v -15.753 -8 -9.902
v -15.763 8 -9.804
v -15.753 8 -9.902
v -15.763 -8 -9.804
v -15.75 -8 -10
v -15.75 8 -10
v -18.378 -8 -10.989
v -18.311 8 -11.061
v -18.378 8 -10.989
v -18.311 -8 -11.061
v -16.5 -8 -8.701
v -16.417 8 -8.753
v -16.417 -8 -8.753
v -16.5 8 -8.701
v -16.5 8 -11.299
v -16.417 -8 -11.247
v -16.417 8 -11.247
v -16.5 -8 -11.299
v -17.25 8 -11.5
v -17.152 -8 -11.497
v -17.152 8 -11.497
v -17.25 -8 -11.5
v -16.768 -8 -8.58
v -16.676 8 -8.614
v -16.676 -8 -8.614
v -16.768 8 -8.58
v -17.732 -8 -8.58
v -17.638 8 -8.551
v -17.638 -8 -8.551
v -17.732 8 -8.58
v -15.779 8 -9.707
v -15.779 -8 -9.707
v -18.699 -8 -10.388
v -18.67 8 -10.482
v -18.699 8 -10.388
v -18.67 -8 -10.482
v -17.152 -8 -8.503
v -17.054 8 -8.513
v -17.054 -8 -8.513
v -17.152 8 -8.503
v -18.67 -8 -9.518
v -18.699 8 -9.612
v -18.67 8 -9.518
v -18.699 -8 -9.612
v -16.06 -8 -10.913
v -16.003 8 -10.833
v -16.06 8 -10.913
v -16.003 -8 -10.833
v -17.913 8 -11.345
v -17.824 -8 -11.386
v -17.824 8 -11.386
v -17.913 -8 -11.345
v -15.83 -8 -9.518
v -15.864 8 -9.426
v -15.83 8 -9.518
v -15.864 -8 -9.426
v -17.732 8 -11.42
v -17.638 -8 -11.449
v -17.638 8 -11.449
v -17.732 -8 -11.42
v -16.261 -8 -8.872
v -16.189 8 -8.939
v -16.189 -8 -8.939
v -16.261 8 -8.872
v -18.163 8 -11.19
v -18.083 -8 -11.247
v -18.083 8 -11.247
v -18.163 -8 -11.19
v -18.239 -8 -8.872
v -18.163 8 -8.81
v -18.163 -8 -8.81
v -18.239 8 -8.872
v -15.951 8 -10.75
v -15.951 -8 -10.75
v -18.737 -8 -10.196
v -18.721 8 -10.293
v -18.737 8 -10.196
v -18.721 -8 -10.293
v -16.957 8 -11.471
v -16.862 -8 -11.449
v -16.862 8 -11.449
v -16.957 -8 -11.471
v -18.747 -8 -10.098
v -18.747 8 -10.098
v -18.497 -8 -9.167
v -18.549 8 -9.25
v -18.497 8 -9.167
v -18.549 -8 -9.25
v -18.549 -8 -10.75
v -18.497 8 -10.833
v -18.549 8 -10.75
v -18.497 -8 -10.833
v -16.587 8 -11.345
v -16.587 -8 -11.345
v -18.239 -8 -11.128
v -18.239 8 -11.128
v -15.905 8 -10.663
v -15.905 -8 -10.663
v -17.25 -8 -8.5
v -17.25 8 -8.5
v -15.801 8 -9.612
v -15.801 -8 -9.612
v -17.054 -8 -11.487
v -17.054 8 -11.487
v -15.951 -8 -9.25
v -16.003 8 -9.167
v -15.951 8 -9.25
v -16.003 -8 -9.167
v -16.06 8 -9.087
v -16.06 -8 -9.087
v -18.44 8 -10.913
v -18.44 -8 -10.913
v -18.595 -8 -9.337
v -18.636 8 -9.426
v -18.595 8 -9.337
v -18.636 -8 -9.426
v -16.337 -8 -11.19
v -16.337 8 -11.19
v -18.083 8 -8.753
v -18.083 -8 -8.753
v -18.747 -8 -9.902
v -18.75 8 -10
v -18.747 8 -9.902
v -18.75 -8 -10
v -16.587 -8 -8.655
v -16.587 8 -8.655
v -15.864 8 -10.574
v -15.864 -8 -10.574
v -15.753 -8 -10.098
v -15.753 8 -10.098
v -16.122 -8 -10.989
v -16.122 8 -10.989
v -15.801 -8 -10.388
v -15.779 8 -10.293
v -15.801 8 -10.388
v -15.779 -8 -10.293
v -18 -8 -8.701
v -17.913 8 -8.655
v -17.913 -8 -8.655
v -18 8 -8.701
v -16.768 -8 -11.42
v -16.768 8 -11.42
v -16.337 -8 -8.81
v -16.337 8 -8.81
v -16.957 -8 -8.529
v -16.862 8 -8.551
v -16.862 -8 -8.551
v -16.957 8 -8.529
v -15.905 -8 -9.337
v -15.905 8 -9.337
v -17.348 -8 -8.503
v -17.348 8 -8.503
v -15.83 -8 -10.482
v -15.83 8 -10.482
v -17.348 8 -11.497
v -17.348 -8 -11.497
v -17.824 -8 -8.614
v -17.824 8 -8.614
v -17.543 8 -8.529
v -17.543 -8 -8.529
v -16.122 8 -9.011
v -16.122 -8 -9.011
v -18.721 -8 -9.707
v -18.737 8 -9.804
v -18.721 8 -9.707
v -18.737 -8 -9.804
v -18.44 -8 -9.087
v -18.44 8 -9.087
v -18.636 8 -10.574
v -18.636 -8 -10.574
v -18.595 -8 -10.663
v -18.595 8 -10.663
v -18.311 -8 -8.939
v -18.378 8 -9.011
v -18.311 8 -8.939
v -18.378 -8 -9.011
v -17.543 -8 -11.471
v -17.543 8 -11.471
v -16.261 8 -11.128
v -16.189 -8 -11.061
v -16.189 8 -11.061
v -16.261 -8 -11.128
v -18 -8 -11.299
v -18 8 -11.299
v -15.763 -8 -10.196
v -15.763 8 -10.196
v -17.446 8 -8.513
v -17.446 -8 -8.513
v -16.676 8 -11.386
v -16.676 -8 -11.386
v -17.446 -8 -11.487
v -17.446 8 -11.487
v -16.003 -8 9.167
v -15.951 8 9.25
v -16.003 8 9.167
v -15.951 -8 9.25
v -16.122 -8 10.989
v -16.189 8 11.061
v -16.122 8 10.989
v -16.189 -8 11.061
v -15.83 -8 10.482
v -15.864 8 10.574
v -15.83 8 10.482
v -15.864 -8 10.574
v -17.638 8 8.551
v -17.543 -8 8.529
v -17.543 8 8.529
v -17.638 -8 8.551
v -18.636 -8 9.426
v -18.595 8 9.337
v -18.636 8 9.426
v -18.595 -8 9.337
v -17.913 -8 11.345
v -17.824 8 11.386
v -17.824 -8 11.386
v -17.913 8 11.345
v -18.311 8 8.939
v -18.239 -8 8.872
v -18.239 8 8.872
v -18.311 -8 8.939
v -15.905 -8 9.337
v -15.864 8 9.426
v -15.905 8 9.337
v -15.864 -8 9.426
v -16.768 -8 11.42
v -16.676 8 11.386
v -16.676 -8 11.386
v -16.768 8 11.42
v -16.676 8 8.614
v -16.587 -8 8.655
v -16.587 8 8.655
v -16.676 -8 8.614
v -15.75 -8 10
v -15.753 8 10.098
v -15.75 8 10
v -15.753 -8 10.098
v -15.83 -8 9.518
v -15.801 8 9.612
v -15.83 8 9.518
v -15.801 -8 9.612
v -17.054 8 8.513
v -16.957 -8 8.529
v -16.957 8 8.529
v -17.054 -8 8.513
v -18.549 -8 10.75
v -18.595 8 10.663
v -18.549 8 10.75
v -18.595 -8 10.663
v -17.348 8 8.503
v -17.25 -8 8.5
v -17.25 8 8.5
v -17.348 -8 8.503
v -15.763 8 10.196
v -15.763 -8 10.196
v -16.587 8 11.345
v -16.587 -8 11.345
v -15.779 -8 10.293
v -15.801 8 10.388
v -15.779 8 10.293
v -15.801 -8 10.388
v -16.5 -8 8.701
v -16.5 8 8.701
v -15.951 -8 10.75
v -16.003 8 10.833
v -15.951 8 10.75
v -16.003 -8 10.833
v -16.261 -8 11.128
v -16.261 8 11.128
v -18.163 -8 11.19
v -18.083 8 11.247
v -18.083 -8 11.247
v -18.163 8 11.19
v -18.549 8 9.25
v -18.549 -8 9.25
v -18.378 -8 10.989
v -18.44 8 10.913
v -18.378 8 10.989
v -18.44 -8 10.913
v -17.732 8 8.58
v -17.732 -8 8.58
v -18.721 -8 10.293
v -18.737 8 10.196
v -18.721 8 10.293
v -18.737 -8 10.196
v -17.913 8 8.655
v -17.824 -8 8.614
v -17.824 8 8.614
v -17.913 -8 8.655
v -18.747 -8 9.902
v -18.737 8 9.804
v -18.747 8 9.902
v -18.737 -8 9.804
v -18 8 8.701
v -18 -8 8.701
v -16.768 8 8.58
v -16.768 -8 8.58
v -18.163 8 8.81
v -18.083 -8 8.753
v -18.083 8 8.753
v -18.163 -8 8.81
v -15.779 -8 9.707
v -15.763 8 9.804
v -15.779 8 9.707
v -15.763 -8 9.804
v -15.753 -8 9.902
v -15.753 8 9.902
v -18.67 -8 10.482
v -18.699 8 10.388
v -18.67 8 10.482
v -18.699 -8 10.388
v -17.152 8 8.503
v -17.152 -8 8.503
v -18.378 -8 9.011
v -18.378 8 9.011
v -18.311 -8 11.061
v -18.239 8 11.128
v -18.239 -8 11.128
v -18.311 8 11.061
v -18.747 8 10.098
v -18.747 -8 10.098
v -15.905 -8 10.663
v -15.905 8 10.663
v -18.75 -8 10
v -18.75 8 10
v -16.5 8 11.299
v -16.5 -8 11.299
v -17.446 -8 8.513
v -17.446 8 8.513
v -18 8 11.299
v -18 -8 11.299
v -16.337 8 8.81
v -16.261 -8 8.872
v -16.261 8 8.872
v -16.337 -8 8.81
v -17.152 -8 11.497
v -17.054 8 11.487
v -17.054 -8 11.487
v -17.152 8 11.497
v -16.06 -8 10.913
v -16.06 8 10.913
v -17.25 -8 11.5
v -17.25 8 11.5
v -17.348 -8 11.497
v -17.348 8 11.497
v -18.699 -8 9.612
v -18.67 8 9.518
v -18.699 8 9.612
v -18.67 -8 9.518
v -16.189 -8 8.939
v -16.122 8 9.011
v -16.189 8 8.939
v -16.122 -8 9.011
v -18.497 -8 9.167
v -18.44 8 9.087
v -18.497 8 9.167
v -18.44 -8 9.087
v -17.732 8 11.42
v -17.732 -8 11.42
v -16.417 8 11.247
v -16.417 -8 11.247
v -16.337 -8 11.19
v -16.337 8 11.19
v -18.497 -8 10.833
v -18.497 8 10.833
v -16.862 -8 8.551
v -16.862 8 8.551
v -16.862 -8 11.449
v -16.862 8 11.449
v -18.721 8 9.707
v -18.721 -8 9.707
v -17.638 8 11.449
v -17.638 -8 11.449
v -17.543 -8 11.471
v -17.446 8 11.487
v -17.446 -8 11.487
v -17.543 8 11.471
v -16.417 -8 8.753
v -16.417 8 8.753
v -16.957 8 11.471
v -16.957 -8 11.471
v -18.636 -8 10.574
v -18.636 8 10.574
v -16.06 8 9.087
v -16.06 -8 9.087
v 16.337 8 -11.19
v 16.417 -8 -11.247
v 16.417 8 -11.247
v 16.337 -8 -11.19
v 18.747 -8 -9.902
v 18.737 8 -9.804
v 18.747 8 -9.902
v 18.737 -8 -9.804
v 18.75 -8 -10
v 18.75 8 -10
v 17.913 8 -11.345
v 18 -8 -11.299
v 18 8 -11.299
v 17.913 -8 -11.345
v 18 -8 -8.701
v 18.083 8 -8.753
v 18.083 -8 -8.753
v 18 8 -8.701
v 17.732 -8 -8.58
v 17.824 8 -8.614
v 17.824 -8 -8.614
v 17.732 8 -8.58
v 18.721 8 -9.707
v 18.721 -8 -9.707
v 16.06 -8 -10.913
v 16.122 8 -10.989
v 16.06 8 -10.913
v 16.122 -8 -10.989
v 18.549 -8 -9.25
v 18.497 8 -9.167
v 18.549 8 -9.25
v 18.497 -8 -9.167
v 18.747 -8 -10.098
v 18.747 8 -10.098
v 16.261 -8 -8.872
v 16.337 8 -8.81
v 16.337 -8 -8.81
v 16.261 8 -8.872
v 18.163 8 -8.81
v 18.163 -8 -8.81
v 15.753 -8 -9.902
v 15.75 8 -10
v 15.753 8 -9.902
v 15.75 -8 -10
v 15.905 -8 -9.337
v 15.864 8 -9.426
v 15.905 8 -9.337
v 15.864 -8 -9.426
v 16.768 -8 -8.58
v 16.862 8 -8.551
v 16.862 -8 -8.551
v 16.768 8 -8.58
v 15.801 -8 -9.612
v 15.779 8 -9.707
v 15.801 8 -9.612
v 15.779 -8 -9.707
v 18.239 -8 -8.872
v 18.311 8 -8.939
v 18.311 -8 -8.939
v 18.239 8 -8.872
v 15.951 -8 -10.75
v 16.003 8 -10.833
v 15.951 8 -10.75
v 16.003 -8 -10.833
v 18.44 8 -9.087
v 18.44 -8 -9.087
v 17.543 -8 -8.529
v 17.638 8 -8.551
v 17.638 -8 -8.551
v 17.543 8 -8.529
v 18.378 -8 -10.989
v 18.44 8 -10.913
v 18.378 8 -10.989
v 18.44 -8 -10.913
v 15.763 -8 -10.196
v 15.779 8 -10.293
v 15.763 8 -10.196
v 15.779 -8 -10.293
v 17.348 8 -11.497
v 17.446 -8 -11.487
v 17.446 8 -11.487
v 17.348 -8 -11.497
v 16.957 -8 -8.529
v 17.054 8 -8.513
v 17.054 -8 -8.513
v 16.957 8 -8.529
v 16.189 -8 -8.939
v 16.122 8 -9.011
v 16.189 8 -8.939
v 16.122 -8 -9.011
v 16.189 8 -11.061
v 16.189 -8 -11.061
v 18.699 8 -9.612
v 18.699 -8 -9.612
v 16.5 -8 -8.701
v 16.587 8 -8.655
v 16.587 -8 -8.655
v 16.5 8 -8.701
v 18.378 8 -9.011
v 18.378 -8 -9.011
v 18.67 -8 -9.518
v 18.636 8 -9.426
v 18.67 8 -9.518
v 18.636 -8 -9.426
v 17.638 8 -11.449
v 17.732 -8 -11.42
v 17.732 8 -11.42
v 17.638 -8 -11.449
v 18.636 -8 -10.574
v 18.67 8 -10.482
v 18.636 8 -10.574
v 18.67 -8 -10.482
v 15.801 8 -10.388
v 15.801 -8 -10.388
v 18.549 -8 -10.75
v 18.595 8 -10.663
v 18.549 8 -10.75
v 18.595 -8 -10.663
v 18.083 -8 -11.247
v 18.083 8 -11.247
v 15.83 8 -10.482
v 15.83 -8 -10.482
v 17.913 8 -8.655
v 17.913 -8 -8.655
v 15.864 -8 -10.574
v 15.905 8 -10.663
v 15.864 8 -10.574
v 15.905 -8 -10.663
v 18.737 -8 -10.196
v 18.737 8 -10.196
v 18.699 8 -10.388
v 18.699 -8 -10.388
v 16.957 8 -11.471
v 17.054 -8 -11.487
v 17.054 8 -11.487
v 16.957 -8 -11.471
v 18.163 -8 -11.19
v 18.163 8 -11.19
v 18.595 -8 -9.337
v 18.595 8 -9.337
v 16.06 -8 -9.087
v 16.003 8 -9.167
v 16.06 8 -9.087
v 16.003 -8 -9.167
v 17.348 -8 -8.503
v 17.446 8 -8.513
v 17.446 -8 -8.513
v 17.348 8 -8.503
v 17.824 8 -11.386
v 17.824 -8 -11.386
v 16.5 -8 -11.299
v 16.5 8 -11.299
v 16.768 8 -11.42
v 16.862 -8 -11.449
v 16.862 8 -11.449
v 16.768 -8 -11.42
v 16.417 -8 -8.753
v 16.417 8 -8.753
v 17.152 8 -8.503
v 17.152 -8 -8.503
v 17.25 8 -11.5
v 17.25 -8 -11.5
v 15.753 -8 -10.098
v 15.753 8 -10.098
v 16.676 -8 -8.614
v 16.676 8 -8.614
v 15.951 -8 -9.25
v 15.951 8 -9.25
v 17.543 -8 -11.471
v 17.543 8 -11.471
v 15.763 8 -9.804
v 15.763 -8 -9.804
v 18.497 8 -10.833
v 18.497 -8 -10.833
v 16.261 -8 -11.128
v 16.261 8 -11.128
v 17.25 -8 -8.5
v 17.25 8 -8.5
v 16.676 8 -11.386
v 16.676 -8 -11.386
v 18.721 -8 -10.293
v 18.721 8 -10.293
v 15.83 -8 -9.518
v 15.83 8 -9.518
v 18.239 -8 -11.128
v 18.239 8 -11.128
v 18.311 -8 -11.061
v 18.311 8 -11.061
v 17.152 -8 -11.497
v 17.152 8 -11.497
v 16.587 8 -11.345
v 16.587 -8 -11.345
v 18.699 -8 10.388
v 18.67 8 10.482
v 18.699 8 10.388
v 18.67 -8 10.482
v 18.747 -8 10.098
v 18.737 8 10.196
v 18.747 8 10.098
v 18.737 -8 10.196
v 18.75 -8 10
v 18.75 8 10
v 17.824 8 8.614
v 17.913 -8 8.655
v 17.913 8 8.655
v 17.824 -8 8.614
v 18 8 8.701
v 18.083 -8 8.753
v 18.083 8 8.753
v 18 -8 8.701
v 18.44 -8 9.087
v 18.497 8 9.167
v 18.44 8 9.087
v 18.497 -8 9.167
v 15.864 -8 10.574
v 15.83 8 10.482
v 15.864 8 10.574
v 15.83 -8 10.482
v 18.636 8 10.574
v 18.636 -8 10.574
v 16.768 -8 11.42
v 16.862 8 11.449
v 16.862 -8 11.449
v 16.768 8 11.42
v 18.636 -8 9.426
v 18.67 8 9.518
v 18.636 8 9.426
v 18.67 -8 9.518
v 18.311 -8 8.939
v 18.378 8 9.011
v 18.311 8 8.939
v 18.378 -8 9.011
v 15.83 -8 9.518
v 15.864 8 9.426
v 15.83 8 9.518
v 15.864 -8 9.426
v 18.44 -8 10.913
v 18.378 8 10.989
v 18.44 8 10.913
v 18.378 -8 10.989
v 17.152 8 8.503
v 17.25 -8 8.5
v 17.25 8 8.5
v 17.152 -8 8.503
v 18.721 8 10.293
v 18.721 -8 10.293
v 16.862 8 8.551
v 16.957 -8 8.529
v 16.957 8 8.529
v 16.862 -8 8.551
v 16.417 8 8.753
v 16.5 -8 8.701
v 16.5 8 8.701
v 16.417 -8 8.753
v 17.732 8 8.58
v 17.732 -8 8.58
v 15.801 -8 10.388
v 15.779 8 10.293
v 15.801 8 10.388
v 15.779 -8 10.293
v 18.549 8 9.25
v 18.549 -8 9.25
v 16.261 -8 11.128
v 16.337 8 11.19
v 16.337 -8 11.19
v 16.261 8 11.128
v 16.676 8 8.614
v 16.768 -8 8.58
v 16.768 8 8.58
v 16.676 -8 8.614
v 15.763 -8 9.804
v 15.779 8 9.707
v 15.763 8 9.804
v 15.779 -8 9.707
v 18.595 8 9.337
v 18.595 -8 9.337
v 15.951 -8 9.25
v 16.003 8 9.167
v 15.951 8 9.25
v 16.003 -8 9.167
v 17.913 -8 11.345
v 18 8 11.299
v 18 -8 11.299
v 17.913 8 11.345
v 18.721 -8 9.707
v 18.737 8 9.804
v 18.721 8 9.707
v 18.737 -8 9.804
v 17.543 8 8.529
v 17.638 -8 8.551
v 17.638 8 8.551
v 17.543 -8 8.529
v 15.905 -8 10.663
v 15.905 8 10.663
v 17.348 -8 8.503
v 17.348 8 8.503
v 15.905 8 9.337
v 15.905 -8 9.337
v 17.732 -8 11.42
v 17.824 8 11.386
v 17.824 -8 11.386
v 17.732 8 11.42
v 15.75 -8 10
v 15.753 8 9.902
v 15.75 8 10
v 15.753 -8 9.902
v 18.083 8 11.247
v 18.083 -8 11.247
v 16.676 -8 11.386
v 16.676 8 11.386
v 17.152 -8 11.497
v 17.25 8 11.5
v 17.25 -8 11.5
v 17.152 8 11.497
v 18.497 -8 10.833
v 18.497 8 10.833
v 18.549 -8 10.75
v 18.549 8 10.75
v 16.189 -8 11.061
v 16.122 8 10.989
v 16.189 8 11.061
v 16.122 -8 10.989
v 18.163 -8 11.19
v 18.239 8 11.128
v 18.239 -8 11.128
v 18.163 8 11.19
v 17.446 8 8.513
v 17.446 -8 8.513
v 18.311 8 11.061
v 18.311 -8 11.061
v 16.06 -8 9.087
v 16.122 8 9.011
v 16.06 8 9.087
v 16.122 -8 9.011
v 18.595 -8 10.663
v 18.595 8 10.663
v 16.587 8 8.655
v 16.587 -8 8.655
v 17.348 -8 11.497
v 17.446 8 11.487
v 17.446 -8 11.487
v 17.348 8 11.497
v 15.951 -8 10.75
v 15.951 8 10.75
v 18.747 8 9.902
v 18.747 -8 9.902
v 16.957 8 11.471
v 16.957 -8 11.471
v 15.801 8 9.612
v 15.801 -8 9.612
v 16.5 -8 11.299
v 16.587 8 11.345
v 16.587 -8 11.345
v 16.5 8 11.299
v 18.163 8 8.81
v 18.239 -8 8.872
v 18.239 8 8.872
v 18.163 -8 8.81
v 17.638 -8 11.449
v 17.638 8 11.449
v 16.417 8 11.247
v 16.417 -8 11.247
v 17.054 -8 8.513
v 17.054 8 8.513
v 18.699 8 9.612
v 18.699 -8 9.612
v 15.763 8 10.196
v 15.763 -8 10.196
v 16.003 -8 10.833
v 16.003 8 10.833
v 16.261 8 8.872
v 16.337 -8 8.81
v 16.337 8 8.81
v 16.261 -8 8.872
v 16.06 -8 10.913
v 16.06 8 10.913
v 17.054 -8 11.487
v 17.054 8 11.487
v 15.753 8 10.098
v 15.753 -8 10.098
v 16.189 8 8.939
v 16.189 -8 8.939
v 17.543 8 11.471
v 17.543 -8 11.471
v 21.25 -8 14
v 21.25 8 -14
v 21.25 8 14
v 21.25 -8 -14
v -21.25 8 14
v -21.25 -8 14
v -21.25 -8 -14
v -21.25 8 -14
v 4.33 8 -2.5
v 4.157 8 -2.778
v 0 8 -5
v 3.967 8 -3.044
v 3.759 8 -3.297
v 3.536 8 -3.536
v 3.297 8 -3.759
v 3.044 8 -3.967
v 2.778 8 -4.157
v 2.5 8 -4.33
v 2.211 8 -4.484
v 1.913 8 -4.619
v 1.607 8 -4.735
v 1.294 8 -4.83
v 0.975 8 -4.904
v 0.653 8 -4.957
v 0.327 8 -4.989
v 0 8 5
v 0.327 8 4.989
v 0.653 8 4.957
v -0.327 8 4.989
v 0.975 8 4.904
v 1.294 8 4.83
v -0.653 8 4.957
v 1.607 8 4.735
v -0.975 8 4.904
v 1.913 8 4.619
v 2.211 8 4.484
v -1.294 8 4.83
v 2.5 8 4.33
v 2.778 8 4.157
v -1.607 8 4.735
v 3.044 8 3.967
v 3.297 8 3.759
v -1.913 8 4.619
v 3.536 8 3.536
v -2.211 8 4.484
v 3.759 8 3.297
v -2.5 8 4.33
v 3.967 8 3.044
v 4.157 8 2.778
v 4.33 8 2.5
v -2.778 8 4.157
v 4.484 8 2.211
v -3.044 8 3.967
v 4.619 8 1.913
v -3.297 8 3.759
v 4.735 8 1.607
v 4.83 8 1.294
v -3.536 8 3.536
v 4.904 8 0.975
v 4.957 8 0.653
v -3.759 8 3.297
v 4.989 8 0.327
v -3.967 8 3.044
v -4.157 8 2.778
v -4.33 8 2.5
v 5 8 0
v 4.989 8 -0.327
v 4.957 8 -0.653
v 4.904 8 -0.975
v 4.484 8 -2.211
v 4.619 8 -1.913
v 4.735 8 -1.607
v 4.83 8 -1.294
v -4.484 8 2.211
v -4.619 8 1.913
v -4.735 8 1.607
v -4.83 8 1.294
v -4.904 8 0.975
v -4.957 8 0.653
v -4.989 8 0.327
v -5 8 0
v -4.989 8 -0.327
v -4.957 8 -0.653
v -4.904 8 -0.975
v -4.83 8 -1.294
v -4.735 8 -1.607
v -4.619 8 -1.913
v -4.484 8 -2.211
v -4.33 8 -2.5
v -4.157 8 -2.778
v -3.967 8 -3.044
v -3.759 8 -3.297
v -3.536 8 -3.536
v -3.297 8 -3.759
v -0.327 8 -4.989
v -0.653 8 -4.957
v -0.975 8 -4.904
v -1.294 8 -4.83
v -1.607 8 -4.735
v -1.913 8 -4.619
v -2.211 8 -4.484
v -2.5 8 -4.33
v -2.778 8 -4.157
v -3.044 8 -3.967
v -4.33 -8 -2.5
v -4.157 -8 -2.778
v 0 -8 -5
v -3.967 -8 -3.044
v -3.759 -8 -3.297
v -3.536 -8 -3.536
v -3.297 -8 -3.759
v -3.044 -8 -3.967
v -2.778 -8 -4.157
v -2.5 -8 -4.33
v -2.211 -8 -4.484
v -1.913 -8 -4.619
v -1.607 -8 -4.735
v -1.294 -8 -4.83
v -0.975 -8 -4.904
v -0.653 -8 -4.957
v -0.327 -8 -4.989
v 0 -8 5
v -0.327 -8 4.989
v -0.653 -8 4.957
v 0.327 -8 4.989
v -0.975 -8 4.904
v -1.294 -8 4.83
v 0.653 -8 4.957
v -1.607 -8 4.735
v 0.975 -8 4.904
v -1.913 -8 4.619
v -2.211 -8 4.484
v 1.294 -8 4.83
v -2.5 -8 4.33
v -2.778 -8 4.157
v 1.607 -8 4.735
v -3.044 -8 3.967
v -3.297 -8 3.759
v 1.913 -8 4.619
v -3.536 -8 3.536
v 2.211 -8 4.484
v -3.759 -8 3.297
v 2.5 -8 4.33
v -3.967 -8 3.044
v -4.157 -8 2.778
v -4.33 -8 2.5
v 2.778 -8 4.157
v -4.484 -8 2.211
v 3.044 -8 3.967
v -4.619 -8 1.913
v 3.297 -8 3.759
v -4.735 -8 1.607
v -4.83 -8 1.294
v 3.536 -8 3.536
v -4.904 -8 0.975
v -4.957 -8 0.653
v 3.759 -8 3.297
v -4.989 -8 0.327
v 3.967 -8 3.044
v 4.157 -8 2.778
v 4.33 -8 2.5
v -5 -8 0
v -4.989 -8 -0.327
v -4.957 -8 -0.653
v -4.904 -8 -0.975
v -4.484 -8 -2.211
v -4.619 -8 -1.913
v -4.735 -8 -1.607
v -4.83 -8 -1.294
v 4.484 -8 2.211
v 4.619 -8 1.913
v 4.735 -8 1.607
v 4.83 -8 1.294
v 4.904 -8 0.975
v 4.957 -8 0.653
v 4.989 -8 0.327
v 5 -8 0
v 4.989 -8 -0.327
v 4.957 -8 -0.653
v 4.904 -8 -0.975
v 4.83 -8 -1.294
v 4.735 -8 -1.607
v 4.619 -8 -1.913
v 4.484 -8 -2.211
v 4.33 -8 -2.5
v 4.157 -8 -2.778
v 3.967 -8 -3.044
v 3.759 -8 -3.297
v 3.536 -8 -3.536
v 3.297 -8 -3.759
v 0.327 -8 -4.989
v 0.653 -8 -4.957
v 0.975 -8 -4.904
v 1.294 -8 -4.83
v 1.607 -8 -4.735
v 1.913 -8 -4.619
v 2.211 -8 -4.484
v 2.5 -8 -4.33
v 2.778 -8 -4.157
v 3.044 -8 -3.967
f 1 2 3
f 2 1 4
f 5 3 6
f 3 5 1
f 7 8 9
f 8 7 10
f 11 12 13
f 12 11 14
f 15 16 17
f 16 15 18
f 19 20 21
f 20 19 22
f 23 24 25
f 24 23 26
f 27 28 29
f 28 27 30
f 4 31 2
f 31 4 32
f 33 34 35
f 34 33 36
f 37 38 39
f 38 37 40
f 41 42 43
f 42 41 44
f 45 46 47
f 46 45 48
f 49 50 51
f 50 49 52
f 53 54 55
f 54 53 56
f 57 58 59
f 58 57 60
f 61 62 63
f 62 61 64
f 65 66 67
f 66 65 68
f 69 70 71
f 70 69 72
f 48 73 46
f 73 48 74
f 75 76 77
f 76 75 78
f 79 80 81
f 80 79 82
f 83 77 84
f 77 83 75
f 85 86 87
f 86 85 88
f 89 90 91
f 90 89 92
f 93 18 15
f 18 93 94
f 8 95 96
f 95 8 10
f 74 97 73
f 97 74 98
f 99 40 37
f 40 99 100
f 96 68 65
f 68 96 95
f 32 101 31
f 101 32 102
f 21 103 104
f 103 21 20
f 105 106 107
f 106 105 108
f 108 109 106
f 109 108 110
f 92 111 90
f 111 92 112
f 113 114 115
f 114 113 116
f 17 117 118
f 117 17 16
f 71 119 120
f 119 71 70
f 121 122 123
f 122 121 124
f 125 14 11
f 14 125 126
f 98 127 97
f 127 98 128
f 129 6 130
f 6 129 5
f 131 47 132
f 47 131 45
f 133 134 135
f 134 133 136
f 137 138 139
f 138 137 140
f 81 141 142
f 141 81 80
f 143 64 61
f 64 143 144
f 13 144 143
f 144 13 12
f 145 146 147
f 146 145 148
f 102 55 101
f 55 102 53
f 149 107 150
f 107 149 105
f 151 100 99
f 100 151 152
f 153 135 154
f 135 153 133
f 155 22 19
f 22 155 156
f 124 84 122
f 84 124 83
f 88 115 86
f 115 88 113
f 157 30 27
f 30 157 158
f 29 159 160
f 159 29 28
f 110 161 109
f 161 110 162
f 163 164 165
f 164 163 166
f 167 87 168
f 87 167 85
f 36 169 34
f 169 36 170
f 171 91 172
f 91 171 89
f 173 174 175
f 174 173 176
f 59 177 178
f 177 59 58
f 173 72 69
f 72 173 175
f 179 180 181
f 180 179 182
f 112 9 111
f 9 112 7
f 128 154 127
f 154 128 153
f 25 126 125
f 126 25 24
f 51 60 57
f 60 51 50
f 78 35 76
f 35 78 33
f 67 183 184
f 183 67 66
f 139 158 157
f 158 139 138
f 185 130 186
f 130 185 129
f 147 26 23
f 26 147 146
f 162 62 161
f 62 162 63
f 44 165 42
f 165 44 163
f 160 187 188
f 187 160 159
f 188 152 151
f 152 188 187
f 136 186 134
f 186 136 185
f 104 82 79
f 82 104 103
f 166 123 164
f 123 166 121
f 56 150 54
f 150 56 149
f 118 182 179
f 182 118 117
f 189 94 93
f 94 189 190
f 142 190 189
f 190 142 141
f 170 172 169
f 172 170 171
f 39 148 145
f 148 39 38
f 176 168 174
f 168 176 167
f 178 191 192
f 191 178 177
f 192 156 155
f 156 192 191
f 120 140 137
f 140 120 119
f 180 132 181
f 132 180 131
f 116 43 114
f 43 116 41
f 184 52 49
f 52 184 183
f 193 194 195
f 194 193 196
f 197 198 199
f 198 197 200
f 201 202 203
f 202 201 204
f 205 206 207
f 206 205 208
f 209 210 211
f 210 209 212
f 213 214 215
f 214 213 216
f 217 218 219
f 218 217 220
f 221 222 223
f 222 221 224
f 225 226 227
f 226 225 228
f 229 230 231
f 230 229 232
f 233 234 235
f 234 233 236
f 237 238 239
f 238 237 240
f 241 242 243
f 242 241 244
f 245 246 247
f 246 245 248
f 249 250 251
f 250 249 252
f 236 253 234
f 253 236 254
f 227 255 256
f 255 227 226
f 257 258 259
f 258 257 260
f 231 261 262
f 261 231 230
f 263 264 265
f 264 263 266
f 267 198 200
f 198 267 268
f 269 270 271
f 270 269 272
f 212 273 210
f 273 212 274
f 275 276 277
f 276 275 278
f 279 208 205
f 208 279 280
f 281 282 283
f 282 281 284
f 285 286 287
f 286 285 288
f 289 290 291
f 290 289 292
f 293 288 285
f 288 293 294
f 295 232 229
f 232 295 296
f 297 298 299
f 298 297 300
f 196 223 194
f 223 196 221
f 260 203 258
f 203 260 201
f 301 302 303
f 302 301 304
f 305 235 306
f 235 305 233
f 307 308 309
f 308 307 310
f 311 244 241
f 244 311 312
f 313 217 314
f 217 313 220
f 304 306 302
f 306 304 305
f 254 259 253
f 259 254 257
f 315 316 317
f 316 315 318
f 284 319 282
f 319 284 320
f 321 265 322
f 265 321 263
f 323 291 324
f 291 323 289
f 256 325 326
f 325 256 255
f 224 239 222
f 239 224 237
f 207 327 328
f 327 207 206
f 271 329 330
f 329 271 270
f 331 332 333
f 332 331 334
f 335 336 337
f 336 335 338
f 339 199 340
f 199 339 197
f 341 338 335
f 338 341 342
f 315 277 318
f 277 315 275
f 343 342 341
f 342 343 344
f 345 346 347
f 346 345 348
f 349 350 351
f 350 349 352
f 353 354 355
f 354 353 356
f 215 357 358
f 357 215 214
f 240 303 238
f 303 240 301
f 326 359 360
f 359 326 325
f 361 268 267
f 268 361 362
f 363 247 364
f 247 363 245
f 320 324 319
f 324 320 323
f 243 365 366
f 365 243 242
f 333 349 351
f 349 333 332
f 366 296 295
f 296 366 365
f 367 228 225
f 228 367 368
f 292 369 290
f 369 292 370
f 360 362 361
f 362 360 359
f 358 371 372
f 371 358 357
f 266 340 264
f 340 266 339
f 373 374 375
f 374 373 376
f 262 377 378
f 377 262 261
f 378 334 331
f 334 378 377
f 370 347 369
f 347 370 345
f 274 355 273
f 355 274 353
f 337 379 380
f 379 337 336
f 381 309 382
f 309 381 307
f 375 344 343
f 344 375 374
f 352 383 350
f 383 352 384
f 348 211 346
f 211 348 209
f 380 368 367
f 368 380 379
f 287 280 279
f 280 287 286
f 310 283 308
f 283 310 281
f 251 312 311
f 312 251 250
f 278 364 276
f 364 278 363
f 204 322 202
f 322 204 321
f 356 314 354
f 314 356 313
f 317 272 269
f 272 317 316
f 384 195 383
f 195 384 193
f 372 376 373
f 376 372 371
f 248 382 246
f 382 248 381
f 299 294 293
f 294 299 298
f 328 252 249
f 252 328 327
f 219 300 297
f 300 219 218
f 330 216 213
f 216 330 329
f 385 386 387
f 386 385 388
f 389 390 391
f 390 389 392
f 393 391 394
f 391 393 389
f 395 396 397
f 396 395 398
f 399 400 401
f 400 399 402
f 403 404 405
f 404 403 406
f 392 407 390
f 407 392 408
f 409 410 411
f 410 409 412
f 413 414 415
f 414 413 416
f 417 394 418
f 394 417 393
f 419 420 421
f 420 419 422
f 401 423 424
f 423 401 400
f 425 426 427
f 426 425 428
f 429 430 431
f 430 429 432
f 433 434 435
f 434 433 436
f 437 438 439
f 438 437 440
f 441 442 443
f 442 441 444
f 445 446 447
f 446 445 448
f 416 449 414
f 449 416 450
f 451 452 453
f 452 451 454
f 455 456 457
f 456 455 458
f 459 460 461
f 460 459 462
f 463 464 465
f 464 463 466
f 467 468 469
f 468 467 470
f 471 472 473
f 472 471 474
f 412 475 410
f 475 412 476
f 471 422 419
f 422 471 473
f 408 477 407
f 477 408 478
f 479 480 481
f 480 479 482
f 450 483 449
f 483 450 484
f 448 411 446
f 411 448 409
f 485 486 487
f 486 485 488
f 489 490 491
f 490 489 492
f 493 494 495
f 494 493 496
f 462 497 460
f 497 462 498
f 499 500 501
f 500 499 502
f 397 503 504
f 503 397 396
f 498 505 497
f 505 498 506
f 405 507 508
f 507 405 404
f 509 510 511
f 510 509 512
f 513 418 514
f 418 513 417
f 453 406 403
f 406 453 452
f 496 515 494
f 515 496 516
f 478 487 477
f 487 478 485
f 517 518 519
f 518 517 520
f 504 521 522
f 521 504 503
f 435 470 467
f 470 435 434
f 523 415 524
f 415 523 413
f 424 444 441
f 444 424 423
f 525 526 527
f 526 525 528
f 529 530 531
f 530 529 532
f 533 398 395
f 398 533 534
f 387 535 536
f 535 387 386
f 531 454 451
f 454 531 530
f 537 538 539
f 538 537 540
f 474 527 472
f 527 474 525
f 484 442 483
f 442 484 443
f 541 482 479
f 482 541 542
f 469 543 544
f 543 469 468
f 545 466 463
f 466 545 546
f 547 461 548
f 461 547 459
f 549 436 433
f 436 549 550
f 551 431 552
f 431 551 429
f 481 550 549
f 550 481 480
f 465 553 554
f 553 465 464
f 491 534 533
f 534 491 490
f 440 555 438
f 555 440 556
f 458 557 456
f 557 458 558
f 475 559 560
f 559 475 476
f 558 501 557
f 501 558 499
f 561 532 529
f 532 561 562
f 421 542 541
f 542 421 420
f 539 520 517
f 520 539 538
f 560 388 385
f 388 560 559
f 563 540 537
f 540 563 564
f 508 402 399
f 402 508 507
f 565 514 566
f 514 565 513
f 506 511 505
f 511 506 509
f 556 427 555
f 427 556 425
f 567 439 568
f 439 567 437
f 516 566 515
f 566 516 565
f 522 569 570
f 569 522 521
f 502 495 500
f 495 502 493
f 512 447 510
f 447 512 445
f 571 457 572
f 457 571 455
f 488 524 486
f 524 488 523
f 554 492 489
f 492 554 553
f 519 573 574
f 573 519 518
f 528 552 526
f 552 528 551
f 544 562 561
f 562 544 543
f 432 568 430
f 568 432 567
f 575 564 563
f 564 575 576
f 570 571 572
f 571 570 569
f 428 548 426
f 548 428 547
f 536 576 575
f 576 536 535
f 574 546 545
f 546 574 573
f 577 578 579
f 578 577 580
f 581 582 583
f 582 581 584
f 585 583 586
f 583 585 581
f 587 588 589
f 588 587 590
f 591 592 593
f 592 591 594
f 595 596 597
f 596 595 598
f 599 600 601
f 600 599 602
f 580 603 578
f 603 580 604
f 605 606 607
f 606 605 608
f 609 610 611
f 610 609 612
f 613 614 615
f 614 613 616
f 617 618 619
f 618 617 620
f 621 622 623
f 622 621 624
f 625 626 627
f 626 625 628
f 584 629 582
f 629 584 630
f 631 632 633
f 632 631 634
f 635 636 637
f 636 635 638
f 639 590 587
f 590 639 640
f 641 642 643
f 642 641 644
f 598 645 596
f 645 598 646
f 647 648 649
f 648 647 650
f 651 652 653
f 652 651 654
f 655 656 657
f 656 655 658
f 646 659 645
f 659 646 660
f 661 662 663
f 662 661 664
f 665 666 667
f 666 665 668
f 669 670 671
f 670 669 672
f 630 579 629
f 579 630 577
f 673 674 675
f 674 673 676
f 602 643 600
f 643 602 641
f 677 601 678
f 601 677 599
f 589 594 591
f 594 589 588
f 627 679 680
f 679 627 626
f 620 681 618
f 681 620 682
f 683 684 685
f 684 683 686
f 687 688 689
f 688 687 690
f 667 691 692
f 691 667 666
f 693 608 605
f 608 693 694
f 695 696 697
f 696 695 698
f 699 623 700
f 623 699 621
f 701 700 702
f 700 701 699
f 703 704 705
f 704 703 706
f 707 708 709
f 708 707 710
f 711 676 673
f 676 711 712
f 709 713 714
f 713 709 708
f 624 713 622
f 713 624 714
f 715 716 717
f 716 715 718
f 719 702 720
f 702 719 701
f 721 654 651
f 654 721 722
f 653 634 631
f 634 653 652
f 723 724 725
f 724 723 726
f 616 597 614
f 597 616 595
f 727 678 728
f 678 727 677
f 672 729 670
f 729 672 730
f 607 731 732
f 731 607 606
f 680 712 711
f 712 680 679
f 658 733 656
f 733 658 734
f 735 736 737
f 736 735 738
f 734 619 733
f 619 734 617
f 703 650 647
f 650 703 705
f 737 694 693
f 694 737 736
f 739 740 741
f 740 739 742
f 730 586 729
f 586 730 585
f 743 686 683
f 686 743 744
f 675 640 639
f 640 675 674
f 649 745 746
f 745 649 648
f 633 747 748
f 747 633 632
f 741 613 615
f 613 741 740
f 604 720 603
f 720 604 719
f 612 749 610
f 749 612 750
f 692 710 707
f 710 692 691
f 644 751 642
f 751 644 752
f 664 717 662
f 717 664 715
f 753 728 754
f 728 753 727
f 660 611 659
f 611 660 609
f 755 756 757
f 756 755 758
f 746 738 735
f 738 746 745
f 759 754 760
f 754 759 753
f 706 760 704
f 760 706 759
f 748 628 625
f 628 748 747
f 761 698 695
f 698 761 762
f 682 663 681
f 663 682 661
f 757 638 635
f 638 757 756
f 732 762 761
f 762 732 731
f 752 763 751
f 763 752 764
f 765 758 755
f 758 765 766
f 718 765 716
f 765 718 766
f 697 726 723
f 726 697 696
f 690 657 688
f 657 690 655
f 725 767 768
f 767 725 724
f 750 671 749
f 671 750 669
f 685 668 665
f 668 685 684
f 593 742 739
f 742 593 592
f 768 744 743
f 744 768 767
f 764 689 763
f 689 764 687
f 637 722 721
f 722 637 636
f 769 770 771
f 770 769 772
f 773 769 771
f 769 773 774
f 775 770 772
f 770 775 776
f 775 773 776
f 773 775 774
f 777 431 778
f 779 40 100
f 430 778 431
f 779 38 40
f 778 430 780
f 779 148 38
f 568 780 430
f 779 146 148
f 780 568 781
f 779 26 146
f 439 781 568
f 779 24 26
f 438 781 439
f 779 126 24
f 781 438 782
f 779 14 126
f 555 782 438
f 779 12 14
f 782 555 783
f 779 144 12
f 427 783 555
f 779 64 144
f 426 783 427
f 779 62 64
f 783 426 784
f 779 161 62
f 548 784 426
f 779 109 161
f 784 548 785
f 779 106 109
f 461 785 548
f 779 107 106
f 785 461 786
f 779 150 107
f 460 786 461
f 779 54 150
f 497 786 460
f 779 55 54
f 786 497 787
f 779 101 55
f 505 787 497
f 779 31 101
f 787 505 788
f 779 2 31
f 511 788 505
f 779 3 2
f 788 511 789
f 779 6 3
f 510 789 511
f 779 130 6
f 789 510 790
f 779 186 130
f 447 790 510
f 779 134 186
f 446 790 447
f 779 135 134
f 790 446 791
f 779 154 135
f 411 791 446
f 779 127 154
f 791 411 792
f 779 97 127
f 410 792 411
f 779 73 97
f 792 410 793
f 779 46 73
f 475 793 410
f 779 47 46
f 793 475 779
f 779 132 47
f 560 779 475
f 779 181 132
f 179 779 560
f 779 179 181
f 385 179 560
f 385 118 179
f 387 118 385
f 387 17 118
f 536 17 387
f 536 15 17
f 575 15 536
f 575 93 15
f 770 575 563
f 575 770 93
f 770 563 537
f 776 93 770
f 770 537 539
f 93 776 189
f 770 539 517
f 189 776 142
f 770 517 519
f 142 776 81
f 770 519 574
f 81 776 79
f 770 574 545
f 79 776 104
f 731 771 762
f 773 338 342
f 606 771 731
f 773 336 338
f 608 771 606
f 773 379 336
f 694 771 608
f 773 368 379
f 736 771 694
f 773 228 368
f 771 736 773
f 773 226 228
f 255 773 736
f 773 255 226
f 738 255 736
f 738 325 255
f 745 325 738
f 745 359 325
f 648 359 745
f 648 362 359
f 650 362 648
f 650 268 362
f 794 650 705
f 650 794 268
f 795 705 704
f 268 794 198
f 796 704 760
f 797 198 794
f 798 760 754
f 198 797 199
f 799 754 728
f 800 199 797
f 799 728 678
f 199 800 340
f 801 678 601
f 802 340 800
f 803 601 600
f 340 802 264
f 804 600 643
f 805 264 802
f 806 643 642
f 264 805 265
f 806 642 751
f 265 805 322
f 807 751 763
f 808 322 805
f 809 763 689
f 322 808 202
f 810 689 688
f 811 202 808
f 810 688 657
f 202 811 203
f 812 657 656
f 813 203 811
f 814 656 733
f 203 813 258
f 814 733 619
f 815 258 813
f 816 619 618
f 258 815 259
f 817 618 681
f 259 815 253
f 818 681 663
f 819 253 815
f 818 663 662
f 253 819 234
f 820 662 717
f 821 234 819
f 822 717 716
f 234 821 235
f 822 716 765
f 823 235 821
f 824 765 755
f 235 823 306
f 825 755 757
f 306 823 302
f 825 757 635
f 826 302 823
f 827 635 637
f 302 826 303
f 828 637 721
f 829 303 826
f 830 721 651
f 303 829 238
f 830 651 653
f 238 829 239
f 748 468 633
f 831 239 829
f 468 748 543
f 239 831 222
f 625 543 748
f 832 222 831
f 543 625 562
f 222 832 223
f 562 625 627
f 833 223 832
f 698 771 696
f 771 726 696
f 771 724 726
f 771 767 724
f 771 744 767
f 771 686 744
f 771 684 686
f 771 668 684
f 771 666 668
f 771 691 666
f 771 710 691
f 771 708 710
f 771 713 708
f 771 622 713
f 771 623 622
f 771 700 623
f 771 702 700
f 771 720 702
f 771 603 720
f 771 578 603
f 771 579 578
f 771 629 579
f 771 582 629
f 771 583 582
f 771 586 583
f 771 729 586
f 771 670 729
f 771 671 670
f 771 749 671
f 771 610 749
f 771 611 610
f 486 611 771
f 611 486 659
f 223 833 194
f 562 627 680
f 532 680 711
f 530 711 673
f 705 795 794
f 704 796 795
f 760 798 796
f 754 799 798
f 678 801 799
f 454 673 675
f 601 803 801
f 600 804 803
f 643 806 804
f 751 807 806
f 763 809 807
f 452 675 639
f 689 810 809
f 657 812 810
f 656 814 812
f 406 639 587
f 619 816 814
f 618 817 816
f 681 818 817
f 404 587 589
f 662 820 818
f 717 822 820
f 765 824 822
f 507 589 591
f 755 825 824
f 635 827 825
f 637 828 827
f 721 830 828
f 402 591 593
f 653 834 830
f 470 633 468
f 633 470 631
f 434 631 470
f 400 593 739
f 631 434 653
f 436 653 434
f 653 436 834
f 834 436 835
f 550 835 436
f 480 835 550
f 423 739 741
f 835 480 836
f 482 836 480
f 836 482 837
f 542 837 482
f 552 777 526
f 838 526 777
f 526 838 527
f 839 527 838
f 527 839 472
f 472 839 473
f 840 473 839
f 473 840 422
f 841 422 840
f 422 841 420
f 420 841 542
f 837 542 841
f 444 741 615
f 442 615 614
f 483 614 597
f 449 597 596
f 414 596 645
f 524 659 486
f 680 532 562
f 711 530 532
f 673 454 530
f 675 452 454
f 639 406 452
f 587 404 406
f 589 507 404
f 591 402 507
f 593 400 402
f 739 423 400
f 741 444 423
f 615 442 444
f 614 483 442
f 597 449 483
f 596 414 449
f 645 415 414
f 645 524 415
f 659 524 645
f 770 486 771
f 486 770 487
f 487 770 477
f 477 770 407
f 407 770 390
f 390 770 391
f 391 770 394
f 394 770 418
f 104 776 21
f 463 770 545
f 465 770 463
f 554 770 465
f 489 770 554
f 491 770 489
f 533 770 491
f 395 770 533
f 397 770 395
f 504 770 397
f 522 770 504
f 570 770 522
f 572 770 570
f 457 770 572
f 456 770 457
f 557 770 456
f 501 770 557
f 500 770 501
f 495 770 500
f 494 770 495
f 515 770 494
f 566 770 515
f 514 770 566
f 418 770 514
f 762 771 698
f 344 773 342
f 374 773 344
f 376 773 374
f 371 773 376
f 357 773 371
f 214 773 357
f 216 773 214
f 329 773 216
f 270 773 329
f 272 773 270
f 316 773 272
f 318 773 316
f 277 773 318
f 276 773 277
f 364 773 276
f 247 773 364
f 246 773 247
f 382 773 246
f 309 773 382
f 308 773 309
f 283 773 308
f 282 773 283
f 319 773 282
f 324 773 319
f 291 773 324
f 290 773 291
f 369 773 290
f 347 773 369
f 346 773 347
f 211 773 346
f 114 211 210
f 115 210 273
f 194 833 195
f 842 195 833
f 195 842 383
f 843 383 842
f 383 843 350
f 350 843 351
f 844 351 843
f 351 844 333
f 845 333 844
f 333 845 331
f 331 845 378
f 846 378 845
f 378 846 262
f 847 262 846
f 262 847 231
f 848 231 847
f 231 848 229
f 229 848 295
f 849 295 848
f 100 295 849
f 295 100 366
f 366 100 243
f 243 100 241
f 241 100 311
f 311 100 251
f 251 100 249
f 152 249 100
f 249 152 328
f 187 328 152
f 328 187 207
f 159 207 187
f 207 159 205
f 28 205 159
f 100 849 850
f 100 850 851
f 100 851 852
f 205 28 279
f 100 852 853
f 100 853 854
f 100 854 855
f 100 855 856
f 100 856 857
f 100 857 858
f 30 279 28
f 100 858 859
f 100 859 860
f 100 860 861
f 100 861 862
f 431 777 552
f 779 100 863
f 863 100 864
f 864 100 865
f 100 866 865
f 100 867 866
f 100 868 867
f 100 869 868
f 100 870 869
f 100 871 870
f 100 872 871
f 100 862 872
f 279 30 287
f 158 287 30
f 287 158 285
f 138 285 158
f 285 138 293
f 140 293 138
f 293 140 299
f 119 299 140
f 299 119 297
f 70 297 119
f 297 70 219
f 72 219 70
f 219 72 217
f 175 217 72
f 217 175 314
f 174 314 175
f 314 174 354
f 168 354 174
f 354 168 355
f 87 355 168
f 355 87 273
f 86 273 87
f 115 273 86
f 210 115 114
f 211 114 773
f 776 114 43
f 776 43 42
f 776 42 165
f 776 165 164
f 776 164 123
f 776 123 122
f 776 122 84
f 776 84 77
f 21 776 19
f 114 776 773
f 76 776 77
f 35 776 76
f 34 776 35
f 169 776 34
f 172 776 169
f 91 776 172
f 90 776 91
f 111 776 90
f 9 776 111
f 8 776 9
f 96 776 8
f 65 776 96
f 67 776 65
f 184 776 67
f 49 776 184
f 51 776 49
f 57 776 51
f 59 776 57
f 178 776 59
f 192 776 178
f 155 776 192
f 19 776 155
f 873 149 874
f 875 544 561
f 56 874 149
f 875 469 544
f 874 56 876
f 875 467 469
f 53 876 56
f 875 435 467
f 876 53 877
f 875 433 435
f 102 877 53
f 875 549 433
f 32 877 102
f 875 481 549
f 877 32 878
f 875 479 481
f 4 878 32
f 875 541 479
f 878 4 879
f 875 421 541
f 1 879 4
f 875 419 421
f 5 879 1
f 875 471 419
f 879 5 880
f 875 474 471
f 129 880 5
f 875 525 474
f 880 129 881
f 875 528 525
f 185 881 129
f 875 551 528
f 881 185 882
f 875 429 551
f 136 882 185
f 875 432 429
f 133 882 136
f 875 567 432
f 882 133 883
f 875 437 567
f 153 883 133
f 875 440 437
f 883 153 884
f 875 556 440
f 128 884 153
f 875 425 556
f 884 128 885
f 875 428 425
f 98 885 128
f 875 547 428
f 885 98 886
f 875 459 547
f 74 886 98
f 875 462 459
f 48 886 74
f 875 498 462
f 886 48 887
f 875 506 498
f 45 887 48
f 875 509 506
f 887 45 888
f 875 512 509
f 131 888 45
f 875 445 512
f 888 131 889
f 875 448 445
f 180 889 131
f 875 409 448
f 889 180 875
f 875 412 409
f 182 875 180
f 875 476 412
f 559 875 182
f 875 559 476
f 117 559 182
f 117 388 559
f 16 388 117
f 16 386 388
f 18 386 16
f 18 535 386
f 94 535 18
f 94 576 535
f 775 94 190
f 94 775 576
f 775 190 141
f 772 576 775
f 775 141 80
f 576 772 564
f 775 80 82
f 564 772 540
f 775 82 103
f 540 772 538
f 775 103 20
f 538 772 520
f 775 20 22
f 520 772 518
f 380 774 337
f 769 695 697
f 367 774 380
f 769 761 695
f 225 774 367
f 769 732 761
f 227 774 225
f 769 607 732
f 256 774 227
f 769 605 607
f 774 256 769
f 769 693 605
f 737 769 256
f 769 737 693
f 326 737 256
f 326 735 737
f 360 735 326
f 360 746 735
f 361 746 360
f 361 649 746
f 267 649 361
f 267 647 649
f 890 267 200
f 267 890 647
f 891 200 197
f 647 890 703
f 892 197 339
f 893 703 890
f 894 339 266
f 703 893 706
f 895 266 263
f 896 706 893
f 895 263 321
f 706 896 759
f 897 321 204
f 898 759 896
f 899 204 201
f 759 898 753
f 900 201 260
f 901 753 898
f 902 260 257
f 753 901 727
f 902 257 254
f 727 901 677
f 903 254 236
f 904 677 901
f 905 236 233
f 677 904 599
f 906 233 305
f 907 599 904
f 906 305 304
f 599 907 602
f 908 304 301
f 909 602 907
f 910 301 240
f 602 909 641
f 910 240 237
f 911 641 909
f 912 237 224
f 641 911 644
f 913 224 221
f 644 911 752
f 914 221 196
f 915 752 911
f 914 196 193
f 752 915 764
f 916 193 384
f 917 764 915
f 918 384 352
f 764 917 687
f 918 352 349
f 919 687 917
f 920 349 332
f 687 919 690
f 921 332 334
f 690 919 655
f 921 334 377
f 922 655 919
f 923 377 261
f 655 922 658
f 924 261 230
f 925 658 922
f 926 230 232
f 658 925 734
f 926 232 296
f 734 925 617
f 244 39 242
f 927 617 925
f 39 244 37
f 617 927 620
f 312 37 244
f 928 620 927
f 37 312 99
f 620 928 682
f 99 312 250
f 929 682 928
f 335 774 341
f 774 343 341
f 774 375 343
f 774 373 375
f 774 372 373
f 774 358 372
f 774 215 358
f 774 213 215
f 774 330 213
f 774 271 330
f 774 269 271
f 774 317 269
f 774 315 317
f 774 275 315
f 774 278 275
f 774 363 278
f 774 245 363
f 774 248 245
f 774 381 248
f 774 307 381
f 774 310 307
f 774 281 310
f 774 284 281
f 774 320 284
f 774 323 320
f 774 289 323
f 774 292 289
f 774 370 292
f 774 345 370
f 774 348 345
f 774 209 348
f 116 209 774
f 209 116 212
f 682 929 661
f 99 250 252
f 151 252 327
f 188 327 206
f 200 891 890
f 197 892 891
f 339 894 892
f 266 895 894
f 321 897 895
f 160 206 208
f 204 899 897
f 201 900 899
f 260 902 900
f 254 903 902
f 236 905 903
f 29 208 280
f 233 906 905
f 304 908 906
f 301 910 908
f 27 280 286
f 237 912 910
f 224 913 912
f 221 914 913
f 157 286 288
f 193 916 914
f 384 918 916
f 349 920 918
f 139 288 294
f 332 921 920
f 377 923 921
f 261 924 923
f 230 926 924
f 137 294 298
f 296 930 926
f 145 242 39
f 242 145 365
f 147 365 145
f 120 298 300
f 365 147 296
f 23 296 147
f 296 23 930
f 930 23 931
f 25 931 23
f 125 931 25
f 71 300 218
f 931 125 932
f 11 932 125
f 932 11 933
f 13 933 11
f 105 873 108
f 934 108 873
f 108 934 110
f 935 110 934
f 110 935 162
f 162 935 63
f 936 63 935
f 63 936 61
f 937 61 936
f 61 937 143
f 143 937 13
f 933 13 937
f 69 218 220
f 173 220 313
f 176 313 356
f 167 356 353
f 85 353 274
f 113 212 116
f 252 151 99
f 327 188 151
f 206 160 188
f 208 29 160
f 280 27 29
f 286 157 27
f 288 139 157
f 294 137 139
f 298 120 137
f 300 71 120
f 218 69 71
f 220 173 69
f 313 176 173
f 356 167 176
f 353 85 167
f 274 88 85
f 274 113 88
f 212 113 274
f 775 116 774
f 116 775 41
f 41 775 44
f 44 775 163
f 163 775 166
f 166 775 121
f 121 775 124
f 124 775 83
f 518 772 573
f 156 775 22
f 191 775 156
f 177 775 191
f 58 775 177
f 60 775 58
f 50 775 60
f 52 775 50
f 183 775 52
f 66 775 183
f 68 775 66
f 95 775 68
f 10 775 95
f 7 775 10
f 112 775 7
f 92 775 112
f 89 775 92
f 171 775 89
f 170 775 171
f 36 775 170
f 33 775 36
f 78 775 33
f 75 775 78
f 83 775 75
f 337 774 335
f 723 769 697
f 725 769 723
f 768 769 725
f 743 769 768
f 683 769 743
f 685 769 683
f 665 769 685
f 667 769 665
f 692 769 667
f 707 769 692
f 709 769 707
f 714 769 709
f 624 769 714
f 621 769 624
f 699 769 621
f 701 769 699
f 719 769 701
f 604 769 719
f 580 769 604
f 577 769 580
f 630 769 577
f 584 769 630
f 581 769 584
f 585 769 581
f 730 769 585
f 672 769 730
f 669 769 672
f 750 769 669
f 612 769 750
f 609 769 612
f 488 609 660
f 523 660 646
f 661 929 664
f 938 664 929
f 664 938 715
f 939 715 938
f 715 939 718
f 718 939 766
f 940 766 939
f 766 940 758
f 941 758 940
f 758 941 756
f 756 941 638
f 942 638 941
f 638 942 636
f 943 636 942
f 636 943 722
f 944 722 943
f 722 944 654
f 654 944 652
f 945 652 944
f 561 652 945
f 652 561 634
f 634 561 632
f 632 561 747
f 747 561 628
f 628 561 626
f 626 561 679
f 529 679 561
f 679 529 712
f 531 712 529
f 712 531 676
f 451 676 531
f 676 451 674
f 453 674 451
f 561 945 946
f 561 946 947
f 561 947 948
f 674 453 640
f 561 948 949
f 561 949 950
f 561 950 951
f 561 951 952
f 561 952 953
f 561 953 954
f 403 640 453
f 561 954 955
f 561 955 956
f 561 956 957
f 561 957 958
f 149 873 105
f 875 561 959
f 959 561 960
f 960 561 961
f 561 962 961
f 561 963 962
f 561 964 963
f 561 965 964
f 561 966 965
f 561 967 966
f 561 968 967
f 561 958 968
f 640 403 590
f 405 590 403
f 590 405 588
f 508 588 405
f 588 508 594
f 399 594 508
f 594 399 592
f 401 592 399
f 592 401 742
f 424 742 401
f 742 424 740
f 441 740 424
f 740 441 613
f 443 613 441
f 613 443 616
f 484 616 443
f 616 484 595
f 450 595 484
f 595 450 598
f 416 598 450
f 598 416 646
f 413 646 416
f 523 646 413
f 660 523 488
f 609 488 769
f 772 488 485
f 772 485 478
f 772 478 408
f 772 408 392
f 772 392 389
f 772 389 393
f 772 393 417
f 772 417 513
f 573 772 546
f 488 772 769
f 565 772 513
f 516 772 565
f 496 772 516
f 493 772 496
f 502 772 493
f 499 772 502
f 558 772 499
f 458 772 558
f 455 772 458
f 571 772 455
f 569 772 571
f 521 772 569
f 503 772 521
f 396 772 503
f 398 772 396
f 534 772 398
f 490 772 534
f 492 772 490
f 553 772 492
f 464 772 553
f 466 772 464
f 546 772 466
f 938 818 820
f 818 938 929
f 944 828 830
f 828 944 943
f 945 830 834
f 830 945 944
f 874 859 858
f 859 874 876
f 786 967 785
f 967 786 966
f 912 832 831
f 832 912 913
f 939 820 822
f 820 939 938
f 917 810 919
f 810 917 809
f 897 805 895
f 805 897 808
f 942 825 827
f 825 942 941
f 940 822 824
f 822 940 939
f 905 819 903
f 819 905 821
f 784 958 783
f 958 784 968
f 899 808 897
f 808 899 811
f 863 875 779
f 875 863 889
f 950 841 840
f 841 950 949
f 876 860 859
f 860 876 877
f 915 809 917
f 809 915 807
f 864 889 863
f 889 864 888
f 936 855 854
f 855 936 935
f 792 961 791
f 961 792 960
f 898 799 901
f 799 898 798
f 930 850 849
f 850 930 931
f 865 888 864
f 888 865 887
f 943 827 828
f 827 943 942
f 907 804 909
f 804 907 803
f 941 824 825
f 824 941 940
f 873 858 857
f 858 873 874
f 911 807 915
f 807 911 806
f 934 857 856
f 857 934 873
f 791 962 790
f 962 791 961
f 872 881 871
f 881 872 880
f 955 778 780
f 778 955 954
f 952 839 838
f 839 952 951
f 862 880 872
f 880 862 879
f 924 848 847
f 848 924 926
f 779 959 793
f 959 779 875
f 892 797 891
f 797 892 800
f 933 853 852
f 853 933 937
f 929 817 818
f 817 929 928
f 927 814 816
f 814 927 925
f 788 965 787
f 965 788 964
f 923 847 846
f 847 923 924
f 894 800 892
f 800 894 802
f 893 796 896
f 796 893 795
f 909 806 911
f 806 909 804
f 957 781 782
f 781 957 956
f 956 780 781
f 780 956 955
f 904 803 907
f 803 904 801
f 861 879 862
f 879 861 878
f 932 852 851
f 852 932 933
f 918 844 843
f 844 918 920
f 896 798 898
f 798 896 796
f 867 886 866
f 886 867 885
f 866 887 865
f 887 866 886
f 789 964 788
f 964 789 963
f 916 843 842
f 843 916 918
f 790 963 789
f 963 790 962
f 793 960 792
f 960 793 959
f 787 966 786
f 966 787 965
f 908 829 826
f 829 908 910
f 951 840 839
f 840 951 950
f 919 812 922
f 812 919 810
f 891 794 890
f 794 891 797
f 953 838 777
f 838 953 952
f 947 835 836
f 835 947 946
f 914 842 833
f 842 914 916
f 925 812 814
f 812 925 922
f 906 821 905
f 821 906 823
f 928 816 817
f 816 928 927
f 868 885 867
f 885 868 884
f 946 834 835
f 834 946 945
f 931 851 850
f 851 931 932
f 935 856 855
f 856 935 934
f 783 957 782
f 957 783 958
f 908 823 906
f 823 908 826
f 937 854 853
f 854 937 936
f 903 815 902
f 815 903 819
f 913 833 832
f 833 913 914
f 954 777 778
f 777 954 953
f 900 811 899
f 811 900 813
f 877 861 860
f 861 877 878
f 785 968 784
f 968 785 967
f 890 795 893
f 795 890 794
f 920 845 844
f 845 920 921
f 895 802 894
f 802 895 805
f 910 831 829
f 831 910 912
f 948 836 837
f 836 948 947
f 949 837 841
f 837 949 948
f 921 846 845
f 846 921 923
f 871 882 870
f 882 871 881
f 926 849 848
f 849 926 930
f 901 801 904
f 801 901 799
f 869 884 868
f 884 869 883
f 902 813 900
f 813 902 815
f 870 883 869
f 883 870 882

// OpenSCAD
$fn = 96;

// Leadscrew nut housing overall size (X=length, Y=width, Z=height)
block_width  = 16.0;   // Y
block_height = 28.0;   // Z
block_length = 42.5;   // X

// Internal features
nut_bore_diameter       = 10.0;  // through bore (along Y, per views)
mounting_hole_diameter  = 3.0;   // through holes (along Y, per views)
mounting_hole_offset_x  = 4.0;   // from X edges
mounting_hole_offset_z  = 4.0;   // from Z edges

eps = 0.05;

// Main block body
module main_block_body() {
    cube([block_length, block_width, block_height], center=true);
}

// Through leadscrew/nut bore (along Y)
module leadscrew_nut_bore() {
    rotate([90, 0, 0])
        cylinder(h=block_width + 2*eps, d=nut_bore_diameter, center=true);
}

// Mounting holes (through Y), positioned from X/Z edges using formulas
module mounting_holes() {
    x_pos = block_length/2 - mounting_hole_offset_x;
    z_pos = block_height/2 - mounting_hole_offset_z;

    for (x = [-x_pos, x_pos])
        for (z = [-z_pos, z_pos])
            translate([x, 0, z])
                rotate([90, 0, 0])
                    cylinder(h=block_width + 2*eps, d=mounting_hole_diameter, center=true);
}

// Assemble: one connected solid (block with subtracted holes)
difference() {
    main_block_body();
    leadscrew_nut_bore();
    mounting_holes();
}
